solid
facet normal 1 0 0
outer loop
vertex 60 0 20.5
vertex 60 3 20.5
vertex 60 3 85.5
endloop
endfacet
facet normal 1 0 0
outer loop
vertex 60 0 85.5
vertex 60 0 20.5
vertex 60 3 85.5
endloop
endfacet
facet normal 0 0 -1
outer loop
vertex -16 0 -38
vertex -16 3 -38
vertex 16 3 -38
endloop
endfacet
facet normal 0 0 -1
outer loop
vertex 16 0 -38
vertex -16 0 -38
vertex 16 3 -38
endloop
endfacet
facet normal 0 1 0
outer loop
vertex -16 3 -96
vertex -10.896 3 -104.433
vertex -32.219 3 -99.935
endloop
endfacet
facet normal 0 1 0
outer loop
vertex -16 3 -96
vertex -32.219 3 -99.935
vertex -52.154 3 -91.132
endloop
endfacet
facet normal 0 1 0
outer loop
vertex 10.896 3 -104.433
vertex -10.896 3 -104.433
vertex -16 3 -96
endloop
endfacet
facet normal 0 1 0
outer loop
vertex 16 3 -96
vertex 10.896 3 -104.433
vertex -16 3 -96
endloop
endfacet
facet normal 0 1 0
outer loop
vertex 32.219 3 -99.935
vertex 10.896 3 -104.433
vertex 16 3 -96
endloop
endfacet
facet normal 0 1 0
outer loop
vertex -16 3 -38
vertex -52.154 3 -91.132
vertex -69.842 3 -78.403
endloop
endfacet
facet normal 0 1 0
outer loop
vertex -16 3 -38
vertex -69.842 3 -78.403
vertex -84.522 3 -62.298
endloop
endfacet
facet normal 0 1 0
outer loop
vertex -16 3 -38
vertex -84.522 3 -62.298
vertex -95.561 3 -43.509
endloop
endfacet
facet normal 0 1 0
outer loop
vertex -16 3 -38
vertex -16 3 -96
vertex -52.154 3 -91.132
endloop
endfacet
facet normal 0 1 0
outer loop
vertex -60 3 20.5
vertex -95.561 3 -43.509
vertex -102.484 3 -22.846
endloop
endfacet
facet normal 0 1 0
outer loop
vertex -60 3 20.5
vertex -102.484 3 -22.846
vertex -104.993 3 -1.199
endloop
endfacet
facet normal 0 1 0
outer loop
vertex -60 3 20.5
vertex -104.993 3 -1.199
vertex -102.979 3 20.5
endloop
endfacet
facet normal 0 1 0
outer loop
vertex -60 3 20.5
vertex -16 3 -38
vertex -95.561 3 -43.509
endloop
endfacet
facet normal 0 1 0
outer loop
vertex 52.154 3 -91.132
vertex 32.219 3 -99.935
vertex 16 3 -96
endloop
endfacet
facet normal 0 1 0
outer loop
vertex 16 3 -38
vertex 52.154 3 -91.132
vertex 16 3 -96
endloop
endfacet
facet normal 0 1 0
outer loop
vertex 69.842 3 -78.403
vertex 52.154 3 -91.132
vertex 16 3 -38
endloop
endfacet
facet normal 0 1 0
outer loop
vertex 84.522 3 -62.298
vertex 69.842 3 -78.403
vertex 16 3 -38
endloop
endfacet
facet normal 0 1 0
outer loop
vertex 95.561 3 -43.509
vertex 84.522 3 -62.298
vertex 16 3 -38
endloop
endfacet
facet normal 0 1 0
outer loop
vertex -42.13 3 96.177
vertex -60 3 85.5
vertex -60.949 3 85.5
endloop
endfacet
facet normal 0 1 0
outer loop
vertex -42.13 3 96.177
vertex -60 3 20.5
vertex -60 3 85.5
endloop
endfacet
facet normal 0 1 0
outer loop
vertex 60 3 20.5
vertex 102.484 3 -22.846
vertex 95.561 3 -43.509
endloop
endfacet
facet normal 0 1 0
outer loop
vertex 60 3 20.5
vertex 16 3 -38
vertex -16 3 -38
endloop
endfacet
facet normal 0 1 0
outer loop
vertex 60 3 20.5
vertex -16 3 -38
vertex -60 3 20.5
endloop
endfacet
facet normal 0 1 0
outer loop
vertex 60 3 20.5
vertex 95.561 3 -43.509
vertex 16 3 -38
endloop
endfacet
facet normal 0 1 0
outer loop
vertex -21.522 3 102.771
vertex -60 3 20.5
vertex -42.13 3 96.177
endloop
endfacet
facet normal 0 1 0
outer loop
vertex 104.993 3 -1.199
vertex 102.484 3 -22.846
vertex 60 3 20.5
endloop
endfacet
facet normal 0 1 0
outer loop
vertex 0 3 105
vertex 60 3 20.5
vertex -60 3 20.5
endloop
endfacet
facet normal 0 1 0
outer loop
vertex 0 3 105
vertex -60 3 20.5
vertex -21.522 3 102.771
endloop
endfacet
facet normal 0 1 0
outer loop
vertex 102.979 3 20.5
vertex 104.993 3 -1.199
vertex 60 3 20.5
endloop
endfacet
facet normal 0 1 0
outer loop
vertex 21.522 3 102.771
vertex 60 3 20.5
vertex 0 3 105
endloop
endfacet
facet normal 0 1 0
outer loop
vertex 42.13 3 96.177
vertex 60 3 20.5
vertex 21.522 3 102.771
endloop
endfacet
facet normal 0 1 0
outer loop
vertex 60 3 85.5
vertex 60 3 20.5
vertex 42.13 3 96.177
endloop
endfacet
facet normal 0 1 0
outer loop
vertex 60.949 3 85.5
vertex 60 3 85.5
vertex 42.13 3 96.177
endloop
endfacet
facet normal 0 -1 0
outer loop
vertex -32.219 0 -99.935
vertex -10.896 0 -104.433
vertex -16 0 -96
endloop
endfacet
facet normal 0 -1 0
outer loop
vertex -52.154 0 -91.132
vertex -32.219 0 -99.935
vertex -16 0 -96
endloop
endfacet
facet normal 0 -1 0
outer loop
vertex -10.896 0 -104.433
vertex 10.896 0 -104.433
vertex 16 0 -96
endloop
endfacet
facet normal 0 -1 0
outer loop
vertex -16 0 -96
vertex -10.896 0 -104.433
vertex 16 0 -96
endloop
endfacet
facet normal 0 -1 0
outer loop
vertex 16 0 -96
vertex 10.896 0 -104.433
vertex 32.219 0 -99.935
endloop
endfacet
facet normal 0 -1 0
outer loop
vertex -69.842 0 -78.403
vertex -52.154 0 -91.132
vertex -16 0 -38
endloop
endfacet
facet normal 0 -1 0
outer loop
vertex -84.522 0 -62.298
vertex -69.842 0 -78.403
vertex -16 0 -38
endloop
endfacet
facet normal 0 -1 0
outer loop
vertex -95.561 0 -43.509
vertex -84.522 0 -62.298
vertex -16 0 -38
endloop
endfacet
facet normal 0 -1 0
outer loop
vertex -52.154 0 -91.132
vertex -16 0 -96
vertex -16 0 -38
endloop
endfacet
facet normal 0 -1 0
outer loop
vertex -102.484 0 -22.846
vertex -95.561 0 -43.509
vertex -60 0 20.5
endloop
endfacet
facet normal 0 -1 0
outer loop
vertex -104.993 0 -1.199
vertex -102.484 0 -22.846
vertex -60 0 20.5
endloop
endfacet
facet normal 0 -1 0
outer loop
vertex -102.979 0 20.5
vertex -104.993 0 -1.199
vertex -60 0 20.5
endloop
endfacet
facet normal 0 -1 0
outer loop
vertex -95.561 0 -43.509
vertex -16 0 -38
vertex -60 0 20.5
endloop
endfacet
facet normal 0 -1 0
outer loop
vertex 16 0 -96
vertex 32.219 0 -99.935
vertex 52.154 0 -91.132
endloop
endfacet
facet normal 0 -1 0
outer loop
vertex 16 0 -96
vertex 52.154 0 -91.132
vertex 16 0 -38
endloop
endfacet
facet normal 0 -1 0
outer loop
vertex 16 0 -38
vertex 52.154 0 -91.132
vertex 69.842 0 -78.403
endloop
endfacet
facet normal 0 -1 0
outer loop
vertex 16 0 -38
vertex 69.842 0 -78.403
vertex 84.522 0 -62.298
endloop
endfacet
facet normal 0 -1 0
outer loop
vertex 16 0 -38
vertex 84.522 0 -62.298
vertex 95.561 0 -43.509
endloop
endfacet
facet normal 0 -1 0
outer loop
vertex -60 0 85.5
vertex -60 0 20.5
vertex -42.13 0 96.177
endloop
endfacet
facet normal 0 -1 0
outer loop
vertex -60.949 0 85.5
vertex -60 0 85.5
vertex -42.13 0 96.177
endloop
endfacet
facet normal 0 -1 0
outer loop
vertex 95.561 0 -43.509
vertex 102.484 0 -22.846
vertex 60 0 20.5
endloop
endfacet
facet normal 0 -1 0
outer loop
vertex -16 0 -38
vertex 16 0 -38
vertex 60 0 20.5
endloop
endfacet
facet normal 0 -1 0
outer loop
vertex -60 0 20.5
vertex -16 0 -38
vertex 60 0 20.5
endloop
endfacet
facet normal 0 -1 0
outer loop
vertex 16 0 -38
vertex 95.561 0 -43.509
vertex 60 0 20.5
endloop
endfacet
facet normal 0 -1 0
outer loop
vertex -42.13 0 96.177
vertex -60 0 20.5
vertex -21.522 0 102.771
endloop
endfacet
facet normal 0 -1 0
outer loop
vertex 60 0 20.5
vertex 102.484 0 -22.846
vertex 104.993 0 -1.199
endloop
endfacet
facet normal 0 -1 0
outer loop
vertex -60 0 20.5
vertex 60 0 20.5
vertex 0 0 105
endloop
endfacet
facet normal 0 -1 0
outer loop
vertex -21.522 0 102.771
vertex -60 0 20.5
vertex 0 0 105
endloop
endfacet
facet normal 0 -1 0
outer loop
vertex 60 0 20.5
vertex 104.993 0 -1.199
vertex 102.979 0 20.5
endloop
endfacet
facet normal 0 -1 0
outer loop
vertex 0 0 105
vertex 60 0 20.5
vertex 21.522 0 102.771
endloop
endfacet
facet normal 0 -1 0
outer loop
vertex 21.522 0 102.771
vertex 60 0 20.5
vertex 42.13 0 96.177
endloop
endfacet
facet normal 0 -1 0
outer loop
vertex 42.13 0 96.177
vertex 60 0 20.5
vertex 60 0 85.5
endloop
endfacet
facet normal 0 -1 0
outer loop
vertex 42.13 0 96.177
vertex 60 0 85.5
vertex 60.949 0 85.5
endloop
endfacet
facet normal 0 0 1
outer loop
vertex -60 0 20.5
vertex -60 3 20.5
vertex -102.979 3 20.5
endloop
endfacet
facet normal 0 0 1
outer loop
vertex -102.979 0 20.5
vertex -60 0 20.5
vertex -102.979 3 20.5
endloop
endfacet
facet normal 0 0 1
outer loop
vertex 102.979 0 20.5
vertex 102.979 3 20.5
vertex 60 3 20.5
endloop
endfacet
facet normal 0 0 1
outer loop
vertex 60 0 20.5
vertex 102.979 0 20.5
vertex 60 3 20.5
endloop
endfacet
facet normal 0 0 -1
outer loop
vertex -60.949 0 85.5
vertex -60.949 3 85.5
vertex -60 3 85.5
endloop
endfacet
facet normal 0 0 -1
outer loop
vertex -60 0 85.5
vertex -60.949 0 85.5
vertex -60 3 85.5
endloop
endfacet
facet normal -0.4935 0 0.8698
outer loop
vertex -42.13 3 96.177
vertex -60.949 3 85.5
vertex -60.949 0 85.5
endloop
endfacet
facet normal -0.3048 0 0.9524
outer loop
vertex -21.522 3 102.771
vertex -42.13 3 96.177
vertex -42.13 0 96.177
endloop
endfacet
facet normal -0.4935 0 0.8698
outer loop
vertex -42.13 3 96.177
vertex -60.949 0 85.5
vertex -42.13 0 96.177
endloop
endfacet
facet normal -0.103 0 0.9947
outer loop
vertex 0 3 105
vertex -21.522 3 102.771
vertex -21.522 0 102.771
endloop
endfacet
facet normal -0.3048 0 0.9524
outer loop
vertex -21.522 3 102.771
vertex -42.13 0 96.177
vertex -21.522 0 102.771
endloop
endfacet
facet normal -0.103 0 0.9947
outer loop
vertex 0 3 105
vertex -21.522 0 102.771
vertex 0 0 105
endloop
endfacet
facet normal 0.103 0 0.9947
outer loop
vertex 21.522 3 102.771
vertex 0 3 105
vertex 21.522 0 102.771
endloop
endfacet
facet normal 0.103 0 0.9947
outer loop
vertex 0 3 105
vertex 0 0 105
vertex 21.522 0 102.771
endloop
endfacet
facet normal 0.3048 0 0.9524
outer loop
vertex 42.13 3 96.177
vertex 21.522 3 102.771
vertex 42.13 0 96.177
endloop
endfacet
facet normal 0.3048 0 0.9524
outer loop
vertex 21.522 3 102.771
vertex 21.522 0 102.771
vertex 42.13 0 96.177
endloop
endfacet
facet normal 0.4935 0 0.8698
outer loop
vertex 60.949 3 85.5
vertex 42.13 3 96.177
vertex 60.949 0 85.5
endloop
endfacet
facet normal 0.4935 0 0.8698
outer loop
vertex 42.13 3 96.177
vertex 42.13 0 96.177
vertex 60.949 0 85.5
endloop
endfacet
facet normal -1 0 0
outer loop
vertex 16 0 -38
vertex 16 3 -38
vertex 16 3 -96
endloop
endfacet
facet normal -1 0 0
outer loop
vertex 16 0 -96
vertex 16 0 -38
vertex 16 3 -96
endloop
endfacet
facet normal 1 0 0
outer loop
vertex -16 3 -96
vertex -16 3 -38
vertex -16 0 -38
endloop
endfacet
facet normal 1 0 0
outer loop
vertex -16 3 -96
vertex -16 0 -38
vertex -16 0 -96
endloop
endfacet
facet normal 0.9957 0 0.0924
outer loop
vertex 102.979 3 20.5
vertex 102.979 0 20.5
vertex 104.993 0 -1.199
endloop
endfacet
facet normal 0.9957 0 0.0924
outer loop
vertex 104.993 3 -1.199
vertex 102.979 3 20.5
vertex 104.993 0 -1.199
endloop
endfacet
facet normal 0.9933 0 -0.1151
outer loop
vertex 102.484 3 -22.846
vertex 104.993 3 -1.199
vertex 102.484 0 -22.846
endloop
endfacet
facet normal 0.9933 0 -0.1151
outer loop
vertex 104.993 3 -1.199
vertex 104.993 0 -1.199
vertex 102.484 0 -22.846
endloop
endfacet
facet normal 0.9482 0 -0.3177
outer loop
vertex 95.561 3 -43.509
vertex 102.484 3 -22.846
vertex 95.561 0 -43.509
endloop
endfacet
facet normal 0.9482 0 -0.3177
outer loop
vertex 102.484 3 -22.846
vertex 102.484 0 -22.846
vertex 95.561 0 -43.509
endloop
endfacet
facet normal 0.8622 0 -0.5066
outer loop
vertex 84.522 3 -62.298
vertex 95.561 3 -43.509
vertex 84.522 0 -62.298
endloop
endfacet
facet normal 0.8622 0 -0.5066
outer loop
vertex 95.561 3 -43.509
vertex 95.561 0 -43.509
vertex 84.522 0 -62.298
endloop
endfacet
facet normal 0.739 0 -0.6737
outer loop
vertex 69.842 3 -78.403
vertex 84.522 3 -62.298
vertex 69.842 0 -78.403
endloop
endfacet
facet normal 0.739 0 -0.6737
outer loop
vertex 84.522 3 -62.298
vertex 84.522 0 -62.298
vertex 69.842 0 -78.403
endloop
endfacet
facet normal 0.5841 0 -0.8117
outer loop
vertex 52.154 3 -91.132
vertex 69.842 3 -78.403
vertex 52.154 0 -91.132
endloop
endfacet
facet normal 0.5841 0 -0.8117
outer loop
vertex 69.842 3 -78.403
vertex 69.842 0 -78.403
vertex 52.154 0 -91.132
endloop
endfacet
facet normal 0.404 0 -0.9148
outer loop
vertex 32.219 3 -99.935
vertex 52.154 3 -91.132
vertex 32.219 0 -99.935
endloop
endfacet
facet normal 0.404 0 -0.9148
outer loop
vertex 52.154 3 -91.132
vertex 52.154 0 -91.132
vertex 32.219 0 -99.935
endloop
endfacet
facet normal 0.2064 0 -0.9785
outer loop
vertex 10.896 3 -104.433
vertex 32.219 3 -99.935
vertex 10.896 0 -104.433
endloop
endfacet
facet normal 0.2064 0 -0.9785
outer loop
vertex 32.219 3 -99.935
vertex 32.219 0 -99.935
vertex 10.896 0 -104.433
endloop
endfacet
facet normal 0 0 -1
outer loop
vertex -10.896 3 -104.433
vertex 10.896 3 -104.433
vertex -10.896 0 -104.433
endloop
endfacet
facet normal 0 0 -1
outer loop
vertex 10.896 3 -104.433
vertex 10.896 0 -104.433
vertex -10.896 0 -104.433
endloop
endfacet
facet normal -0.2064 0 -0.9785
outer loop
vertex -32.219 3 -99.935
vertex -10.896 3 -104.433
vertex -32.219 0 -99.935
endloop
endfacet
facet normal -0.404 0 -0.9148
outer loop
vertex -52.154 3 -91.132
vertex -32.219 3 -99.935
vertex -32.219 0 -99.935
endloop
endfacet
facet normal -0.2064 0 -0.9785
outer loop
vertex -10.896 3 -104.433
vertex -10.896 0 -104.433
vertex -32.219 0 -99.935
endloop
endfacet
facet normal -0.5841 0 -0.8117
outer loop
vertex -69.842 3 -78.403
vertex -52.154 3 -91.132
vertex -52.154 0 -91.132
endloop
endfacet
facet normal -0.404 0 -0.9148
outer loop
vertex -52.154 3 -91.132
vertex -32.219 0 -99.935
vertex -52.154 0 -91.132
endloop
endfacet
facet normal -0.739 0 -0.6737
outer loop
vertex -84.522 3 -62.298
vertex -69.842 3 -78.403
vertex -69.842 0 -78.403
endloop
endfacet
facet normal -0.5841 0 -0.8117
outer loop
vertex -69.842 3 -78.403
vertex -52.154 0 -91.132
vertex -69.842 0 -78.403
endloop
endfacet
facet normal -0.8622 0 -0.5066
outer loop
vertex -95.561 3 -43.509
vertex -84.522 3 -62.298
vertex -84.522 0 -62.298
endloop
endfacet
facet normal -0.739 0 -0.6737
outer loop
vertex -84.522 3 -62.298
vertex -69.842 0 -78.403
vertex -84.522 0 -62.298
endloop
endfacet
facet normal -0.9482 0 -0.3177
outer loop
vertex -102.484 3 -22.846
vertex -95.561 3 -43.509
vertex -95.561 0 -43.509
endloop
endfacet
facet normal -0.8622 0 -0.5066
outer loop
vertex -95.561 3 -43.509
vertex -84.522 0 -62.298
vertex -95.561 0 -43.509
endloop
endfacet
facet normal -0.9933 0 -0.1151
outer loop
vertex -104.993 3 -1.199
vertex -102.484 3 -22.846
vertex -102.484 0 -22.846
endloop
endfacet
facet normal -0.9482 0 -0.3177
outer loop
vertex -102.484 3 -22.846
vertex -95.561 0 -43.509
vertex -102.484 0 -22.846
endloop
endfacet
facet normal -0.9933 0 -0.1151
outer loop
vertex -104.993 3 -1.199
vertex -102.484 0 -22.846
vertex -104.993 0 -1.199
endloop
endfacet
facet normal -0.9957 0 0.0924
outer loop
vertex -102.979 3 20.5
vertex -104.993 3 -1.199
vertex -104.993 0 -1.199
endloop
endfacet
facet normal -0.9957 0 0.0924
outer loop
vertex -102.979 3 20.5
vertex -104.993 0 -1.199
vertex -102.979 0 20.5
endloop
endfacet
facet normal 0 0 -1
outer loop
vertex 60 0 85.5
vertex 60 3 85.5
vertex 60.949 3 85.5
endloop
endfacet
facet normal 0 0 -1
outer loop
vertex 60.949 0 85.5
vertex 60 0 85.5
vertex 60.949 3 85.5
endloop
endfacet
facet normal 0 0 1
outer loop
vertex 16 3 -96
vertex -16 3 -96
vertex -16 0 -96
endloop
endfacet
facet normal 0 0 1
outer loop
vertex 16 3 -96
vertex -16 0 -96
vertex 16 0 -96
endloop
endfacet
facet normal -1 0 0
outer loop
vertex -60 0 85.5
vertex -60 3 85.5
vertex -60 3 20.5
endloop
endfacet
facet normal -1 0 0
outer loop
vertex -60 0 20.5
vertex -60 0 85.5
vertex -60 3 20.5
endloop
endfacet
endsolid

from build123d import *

# Parameters (mm, degrees)
SKETCH_1_R            = 105
EXTRUDE_359_DEPTH     = 3
CUT_EXTRUDE_769_DEPTH = 149.522725534
SKETCH_6_W            = 32
SKETCH_6_H            = 58
CUT_EXTRUDE_989_DEPTH = 149.522725534


with BuildPart() as part:
    # 草图1 → Extrude 359 (new body)
    with BuildSketch(Plane(origin=(0, 0, 0), x_dir=(1, 0, 0), z_dir=(0, 1, 0))):
        with Locations(Location((0, 0, 0), (0, 0, 270))):
            Circle(SKETCH_1_R)
    extrude(amount=EXTRUDE_359_DEPTH)

    # 草图5 → Cut-Extrude 769 (cut, through all)
    with BuildSketch(Plane(origin=(0, 3, 0), x_dir=(1, 0, 0), z_dir=(0, 1, 0))):
        with BuildLine():
            Line((-60, -20.5), (-102.979366865, -20.5))
            ThreePointArc((-102.979366865, -20.5), (-88.172313056, -57.014412304), (-60.948748962, -85.5))
            Line((-60.948748962, -85.5), (-60, -85.5))
            Line((-60, -85.5), (-60, -20.5))
        make_face()
        with BuildLine():
            ThreePointArc((60.948748962, -85.5), (88.172313056, -57.014412304), (102.979366865, -20.5))
            Line((102.979366865, -20.5), (60, -20.5))
            Line((60, -20.5), (60, -85.5))
            Line((60, -85.5), (60.948748962, -85.5))
        make_face()
    extrude(amount=-CUT_EXTRUDE_769_DEPTH, mode=Mode.SUBTRACT)

    # 草图6 → Cut-Extrude 989 (cut, through all)
    with BuildSketch(Plane(origin=(0, 3, 0), x_dir=(1, 0, 0), z_dir=(0, 1, 0))):
        with Locations((0, 67)):
            Rectangle(SKETCH_6_W, SKETCH_6_H)
    extrude(amount=-CUT_EXTRUDE_989_DEPTH, mode=Mode.SUBTRACT)


solid = part.part
